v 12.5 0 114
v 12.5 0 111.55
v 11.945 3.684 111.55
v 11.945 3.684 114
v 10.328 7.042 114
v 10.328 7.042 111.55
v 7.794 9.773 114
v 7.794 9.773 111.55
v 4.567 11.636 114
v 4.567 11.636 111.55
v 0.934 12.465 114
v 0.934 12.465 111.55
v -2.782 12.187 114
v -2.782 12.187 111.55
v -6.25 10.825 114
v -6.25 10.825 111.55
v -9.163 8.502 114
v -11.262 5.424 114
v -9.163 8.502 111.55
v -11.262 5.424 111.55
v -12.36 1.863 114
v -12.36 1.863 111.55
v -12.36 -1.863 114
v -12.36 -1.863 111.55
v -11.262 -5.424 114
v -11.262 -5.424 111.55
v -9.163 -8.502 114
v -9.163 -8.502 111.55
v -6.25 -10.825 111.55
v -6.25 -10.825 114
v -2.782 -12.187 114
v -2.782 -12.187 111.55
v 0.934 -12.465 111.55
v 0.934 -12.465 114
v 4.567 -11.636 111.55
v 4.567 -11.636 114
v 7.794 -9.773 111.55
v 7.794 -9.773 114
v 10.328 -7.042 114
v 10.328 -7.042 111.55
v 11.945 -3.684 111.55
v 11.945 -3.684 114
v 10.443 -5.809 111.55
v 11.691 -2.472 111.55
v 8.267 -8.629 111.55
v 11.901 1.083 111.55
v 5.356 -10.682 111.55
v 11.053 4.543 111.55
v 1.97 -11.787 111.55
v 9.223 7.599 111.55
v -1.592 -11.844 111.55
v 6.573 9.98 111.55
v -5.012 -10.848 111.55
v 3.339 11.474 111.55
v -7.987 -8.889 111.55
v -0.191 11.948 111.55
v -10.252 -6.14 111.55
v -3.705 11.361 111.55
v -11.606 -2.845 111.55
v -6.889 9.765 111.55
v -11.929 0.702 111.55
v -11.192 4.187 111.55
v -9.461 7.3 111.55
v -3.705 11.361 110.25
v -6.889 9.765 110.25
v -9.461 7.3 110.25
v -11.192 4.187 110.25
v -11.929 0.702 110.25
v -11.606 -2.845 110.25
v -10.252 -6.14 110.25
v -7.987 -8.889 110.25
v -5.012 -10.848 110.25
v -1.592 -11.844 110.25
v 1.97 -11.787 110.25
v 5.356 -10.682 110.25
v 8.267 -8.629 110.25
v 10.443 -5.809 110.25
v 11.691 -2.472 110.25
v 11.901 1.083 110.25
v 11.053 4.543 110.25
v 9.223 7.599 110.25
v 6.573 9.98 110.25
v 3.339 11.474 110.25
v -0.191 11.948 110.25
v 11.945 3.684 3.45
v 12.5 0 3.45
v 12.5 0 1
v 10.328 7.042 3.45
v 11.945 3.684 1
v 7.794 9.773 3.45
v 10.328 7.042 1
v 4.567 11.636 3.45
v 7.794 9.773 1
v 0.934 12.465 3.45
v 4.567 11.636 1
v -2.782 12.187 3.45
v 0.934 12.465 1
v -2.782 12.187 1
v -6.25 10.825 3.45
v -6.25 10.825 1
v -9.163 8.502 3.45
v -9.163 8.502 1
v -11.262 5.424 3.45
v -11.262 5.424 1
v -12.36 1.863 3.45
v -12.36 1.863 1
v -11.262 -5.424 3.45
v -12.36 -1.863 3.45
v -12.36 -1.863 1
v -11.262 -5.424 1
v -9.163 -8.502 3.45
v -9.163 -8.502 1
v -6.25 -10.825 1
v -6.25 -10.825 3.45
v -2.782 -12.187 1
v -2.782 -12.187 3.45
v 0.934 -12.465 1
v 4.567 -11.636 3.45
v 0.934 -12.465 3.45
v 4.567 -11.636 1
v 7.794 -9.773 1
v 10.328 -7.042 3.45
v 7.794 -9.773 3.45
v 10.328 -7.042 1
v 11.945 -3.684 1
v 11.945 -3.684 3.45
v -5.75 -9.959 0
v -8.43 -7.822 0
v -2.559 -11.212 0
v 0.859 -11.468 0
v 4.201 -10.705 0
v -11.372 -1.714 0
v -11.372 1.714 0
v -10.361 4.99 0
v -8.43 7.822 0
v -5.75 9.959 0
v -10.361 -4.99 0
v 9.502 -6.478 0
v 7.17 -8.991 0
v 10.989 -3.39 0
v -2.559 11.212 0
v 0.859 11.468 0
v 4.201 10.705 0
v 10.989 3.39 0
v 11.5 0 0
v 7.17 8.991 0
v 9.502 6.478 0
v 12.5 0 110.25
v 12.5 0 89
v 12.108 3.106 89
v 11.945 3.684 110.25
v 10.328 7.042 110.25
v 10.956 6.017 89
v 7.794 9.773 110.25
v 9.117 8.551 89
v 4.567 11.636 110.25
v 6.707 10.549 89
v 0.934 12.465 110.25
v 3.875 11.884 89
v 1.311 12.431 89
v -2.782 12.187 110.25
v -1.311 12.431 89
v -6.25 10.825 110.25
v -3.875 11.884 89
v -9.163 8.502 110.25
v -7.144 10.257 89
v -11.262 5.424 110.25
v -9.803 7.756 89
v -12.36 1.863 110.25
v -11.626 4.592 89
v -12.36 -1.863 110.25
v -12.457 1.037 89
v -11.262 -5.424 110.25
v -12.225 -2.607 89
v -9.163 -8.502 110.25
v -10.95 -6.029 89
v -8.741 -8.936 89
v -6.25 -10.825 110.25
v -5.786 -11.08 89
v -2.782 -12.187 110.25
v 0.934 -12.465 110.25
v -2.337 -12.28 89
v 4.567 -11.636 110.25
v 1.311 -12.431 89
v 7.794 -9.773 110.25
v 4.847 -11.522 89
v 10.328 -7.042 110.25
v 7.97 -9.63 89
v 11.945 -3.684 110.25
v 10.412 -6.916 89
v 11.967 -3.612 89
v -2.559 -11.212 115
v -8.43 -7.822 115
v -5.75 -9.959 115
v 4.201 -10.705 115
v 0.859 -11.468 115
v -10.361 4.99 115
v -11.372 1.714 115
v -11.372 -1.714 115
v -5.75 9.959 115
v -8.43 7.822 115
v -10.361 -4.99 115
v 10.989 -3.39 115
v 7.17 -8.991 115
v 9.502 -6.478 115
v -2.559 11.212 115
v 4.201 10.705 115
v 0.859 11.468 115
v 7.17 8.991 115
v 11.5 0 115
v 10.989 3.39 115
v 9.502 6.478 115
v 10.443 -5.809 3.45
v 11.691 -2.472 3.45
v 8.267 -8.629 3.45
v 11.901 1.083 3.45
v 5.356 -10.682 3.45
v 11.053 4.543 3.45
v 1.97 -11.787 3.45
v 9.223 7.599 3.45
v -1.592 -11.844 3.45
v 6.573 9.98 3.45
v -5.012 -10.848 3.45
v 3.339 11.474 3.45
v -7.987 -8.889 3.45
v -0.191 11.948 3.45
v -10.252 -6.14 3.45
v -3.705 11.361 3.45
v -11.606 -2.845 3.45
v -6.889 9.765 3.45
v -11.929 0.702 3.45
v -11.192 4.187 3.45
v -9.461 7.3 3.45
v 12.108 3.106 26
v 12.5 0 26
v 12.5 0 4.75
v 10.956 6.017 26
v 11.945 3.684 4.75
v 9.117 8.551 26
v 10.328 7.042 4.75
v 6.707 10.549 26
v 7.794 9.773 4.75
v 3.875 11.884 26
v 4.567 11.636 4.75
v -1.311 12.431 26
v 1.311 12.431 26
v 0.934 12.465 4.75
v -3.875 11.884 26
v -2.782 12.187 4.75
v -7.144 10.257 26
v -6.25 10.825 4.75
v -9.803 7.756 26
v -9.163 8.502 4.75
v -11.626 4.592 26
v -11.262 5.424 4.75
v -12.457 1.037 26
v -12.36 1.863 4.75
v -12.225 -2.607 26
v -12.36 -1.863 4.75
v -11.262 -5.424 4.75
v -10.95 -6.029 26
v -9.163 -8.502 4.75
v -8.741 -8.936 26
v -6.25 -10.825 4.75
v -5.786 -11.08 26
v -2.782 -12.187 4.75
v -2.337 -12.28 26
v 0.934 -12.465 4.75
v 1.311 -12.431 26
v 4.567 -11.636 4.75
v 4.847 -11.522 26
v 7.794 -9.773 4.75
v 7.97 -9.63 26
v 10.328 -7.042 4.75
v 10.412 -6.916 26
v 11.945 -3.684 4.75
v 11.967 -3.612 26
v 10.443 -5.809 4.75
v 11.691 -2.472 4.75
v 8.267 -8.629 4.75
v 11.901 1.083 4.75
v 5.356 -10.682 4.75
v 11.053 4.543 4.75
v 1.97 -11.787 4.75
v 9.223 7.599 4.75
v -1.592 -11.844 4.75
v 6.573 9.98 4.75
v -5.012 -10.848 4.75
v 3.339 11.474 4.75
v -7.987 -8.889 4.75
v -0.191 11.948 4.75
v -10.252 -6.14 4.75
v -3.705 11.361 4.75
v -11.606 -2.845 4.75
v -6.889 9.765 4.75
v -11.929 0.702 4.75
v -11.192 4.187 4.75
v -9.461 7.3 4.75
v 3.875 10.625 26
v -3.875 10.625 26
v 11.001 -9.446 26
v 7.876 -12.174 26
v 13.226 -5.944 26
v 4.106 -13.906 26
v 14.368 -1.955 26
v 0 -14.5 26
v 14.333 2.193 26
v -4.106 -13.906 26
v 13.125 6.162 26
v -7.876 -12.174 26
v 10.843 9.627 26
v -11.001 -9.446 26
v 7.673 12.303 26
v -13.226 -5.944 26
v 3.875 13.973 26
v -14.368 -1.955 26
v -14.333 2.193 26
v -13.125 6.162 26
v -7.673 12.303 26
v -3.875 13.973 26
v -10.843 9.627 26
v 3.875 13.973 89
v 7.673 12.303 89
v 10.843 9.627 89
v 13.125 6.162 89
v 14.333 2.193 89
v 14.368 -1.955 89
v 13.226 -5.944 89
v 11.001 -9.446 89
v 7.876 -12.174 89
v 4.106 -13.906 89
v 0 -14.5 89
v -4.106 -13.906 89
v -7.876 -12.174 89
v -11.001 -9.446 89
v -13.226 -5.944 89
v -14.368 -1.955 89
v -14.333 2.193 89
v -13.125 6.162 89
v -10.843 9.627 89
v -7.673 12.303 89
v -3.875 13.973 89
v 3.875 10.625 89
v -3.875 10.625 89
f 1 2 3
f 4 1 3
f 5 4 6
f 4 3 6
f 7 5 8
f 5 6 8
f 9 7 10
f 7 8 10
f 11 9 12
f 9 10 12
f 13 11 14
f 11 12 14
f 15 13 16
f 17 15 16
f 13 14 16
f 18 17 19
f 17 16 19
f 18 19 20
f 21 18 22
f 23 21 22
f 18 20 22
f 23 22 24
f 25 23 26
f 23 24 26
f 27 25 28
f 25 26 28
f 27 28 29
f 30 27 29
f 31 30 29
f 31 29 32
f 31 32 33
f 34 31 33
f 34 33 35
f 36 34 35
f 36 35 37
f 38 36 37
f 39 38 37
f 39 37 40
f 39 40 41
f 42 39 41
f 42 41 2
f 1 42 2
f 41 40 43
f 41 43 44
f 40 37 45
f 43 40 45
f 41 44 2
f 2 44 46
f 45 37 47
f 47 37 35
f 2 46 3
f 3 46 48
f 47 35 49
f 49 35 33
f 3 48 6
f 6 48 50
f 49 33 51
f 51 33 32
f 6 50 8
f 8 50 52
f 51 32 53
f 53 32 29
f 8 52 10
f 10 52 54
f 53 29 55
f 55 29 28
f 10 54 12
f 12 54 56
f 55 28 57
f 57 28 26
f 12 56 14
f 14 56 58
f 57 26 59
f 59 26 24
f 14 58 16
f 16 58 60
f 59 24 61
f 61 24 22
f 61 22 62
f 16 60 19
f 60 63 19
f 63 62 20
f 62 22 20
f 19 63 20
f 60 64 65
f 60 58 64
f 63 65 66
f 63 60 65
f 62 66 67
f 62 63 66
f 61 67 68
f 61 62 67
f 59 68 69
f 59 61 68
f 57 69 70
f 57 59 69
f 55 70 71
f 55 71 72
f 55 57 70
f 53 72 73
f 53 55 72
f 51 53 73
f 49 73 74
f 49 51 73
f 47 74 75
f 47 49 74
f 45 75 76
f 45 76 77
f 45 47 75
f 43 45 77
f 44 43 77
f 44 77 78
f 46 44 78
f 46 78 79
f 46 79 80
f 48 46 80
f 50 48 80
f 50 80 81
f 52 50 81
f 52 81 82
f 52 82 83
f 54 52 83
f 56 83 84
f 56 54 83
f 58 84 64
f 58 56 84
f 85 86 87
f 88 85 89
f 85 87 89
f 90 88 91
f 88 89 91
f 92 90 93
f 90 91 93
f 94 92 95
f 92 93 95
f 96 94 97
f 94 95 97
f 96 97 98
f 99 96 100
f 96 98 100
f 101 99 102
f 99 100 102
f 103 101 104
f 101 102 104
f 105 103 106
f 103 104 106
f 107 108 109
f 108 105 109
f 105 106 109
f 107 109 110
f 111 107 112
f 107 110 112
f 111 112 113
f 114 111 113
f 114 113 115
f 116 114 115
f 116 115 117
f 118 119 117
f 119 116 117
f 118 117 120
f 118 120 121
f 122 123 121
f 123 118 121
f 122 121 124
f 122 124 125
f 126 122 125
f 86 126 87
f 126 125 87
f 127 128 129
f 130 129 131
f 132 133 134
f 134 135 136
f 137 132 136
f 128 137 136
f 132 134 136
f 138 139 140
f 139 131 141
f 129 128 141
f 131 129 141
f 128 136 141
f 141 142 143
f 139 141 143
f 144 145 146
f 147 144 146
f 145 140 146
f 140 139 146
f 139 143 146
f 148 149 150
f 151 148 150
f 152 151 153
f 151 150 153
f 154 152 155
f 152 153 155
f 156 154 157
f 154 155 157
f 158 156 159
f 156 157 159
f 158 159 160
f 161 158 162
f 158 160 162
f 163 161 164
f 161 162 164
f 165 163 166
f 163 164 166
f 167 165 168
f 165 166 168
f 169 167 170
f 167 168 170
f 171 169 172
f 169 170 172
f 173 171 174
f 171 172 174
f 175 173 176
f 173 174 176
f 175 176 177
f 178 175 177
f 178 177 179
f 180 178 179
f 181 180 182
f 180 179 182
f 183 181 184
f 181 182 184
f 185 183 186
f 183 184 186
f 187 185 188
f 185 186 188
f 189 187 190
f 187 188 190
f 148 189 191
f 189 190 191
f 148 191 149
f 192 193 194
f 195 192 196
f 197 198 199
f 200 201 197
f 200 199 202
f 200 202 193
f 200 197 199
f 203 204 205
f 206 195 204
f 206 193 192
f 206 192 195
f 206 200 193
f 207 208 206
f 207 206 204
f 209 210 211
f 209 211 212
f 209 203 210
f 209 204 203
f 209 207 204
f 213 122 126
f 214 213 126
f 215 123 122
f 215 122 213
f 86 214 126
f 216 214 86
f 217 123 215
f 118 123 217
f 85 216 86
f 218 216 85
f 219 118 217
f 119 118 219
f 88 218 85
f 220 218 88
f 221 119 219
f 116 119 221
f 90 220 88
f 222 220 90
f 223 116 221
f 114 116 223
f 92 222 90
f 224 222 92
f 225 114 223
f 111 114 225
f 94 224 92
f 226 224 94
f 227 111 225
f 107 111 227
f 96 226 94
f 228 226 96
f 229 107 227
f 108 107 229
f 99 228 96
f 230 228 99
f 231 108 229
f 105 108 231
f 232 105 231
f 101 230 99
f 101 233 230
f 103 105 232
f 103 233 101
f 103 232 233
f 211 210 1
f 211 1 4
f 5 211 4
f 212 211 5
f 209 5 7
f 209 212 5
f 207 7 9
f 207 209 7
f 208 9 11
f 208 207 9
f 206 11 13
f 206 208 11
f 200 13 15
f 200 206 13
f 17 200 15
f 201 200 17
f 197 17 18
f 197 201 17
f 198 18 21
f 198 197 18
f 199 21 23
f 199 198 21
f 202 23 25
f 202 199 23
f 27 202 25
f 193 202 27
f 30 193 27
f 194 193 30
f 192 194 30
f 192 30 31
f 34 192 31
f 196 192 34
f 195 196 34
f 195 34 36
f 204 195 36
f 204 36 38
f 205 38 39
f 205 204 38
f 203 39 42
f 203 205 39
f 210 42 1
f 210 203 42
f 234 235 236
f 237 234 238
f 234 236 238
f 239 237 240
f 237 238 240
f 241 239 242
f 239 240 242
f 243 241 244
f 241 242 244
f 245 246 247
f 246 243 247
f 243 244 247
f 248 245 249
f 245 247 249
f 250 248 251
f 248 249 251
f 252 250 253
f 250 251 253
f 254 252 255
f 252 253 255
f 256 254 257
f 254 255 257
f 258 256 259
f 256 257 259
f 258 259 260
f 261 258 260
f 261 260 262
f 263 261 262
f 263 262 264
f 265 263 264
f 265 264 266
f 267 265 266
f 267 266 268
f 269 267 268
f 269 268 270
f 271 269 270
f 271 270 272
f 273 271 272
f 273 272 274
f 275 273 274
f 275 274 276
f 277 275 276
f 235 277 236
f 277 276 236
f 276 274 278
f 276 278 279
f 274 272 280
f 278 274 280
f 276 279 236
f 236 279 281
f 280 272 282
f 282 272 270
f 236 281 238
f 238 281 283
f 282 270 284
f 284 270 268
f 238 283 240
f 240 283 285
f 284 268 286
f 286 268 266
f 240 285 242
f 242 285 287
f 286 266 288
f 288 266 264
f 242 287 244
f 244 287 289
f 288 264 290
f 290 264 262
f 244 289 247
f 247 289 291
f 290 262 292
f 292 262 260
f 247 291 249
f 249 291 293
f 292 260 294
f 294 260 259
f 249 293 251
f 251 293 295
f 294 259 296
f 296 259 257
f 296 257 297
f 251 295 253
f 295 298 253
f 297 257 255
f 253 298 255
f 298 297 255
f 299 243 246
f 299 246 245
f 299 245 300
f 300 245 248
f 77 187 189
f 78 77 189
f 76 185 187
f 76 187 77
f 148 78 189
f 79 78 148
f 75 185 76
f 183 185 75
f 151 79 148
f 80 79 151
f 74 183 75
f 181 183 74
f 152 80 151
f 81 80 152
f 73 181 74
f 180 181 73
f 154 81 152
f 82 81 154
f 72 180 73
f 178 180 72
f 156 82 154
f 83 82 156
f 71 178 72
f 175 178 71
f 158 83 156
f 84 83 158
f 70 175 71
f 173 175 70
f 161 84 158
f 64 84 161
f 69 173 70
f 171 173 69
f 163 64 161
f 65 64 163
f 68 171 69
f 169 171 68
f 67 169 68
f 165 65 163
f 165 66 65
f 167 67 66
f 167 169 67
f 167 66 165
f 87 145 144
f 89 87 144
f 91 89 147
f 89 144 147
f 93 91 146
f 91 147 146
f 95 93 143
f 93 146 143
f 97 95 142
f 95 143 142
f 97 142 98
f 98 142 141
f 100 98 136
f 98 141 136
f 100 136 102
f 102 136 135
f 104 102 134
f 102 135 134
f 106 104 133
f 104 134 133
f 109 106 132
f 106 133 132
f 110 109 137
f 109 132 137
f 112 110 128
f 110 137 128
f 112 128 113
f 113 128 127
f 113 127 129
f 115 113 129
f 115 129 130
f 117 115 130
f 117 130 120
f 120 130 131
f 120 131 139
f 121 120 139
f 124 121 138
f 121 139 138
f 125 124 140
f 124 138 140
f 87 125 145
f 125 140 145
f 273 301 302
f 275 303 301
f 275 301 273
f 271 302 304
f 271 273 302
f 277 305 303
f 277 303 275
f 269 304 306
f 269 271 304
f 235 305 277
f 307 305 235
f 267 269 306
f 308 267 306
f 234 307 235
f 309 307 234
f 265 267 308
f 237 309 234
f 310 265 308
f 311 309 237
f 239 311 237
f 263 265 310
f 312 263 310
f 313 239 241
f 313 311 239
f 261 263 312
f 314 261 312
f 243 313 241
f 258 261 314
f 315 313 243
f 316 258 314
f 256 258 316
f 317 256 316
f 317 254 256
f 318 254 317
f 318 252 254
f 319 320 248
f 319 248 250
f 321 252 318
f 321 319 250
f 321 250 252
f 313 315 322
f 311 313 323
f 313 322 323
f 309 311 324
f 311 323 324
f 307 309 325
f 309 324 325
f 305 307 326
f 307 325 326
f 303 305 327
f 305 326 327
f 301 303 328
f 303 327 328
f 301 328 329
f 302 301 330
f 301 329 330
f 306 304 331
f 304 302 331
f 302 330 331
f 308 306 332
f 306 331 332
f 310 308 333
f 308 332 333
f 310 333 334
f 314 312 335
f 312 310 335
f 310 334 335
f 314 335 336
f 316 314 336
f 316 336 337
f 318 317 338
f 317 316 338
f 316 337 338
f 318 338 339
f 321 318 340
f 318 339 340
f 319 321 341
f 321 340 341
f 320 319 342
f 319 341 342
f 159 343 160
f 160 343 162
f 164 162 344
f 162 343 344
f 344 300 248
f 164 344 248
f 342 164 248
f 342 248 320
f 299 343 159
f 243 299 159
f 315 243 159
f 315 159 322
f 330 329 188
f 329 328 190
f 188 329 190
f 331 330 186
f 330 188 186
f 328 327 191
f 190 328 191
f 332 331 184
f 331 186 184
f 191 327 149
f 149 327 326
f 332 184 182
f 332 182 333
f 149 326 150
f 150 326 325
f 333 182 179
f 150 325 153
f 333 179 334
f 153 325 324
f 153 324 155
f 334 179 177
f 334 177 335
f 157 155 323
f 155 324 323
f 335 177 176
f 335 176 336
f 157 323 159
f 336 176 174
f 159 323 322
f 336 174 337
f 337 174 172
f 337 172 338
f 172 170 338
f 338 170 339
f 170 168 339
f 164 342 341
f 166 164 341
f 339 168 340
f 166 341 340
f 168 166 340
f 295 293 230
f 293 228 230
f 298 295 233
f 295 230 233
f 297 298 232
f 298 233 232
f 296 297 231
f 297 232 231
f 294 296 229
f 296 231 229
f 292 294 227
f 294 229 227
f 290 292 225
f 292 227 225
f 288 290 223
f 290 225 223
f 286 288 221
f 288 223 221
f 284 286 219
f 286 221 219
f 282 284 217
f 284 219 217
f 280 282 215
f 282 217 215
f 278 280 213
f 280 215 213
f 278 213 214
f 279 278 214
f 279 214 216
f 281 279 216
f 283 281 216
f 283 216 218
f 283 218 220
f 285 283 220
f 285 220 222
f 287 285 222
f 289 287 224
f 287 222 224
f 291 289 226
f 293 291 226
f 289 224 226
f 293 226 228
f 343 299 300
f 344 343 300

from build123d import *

# Parameters (mm, degrees)
SKETCH1_R                      = 12.5
BOSS_EXTRUDE1_DEPTH            = 115
BOSS_EXTRUDE2_DEPTH            = 31.5
BOSS_EXTRUDE2_DEPTH_BACK       = 31.5
SKETCH2_R                      = 14.5
CUT_EXTRUDE1_REACH             = 63.047
SKETCH3_W                      = 7.75
SKETCH3_H                      = 7.75
CUT_EXTRUDE1_DIRECTION_2_REACH = 63.047
SKETCH4_W                      = 1.1
SKETCH4_H                      = 1.3
CHAMFER1_SIZE                  = 1


with BuildPart() as part:
    # Sketch1 → Boss-Extrude1 (new body)
    with BuildSketch(Plane.XY):
        Circle(SKETCH1_R)
    extrude(amount=BOSS_EXTRUDE1_DEPTH)

    # Sketch2 → Boss-Extrude2 (add, two sides: drawn at the far end of the back side and taken through both)
    with BuildSketch(Plane(origin=(0, 0, 57.5), x_dir=(-1, 0, 0), z_dir=(0, 0, -1)).offset(-BOSS_EXTRUDE2_DEPTH_BACK)):
        Circle(SKETCH2_R)
    extrude(amount=BOSS_EXTRUDE2_DEPTH + BOSS_EXTRUDE2_DEPTH_BACK)

    # Cut-Extrude1: up to this face of the body (flat: up to its plane)
    cut_extrude1_end = Plane(part.part.faces().sort_by_distance((14.089878067, 0, 89))[0])
    # Sketch3 → Cut-Extrude1 (cut, up to the picked face)
    with BuildSketch(Plane(origin=(0, 0, 57.5), x_dir=(-1, 0, 0), z_dir=(0, 0, -1)), mode=Mode.PRIVATE) as cut_extrude1_sk1:
        with Locations((0, 14.5)):
            Rectangle(SKETCH3_W, SKETCH3_H)
    cut_extrude1_tool1 = split(extrude(cut_extrude1_sk1.sketch, amount=-CUT_EXTRUDE1_REACH, mode=Mode.PRIVATE), bisect_by=cut_extrude1_end, keep=Keep.BOTH, mode=Mode.PRIVATE)
    add(cut_extrude1_tool1.solids().sort_by(Axis((0, 14.5, 57.5), (0, 0, 1)))[0], mode=Mode.SUBTRACT)

    # Cut-Extrude1 direction 2: up to this face of the body (flat: up to its plane)
    cut_extrude1_direction_2_end = Plane(part.part.faces().sort_by_distance((14.089878067, 0, 26))[0])
    # Sketch3 → Cut-Extrude1 direction 2 (cut, up to the picked face)
    with BuildSketch(Plane(origin=(0, 0, 57.5), x_dir=(-1, 0, 0), z_dir=(0, 0, -1)), mode=Mode.PRIVATE) as cut_extrude1_direction_2_sk1:
        with Locations((0, 14.5)):
            Rectangle(SKETCH3_W, SKETCH3_H)
    cut_extrude1_direction_2_tool1 = split(extrude(cut_extrude1_direction_2_sk1.sketch, amount=CUT_EXTRUDE1_DIRECTION_2_REACH, mode=Mode.PRIVATE), bisect_by=cut_extrude1_direction_2_end, keep=Keep.BOTH, mode=Mode.PRIVATE)
    add(cut_extrude1_direction_2_tool1.solids().sort_by(Axis((0, 14.5, 57.5), (0, 0, -1)))[0], mode=Mode.SUBTRACT)

    # Sketch4 → Cut-Revolve1 (revolve, cut)
    with BuildSketch(Plane(origin=(0, 0, 0), x_dir=(1, 0, 0), z_dir=(0, 1, 0)), mode=Mode.PRIVATE) as cut_revolve1_sk:
        with Locations((-12.5, -4.1)):
            Rectangle(SKETCH4_W, SKETCH4_H)
    cut_revolve1 = revolve(cut_revolve1_sk.sketch.rotate(Axis((0, 0, 0), (0, 0, 1)), 288.059230491), axis=Axis((0, 0, 0), (0, 0, 1)), mode=Mode.SUBTRACT)

    # Mirror1: Cut-Revolve1 across plane
    add(cut_revolve1.mirror(Plane(origin=(0, 0, 57.5), x_dir=(1, 0, 0), z_dir=(0, 0, -1))), mode=Mode.SUBTRACT)

    # Chamfer1
    chamfer1_edges = [part.edges().sort_by_distance(p)[0] for p in [
        (-12.5, 0, 0),
        (-12.5, 0, 115),
    ]]
    chamfer(chamfer1_edges, length=CHAMFER1_SIZE)


solid = part.part
